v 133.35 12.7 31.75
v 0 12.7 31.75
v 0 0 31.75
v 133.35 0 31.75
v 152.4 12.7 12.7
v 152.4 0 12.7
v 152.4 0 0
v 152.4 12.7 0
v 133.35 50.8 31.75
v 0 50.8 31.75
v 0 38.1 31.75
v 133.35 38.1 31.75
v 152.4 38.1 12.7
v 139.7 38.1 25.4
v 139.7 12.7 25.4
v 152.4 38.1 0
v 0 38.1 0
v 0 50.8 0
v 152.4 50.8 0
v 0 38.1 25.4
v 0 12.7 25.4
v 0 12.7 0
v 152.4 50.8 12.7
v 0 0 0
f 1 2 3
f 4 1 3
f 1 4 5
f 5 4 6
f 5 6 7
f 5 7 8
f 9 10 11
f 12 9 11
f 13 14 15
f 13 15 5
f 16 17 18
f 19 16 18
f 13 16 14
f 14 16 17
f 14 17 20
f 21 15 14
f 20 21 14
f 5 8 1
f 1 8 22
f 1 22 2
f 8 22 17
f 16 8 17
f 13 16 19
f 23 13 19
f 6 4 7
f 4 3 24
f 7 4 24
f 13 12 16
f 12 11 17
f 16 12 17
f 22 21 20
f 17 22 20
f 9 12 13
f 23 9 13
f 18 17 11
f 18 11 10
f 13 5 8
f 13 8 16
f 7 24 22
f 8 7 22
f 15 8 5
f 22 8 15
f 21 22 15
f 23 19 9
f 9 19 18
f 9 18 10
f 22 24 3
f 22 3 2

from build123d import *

# Parameters (mm, degrees)
F1_DEPTH = 152.4
F0_W     = 25.4
F0_H     = 25.4
F2_DEPTH = 152.4
F4_DEPTH = 50.801


with BuildPart() as f1:
    # F0 (on Right) → F1 (new body)
    with BuildSketch(Plane.YZ):
        Polygon((0, 31.75), (0, 0), (12.7, 0), (12.7, 25.4), (12.7, 31.75), align=None)
        Polygon((38.1, 25.4), (38.1, 0), (50.8, 0), (50.8, 31.75), (38.1, 31.75), align=None)
    extrude(amount=F1_DEPTH)


with BuildPart() as f2:
    # F0 (on Right) → F2 (new body, through all)
    with BuildSketch(Plane.YZ):
        with Locations((25.4, 12.7)):
            Rectangle(F0_W, F0_H)
    extrude(amount=F2_DEPTH)


with BuildPart() as f4_tool:
    # F3 (on face) → F4 (new body, through all)
    with BuildSketch(Plane.XZ):
        Polygon((133.35, 31.75), (152.4, 12.7), (152.4, 31.75), align=None)
    extrude(amount=-F4_DEPTH)


with BuildPart() as f1_1:
    add(f1.part)

    # F4: cut by f4_tool
    add(f4_tool.part, mode=Mode.SUBTRACT)


with BuildPart() as f2_1:
    add(f2.part)

    # F4: cut by f4_tool
    add(f4_tool.part, mode=Mode.SUBTRACT)


solid = Compound([f1_1.part, f2_1.part])
